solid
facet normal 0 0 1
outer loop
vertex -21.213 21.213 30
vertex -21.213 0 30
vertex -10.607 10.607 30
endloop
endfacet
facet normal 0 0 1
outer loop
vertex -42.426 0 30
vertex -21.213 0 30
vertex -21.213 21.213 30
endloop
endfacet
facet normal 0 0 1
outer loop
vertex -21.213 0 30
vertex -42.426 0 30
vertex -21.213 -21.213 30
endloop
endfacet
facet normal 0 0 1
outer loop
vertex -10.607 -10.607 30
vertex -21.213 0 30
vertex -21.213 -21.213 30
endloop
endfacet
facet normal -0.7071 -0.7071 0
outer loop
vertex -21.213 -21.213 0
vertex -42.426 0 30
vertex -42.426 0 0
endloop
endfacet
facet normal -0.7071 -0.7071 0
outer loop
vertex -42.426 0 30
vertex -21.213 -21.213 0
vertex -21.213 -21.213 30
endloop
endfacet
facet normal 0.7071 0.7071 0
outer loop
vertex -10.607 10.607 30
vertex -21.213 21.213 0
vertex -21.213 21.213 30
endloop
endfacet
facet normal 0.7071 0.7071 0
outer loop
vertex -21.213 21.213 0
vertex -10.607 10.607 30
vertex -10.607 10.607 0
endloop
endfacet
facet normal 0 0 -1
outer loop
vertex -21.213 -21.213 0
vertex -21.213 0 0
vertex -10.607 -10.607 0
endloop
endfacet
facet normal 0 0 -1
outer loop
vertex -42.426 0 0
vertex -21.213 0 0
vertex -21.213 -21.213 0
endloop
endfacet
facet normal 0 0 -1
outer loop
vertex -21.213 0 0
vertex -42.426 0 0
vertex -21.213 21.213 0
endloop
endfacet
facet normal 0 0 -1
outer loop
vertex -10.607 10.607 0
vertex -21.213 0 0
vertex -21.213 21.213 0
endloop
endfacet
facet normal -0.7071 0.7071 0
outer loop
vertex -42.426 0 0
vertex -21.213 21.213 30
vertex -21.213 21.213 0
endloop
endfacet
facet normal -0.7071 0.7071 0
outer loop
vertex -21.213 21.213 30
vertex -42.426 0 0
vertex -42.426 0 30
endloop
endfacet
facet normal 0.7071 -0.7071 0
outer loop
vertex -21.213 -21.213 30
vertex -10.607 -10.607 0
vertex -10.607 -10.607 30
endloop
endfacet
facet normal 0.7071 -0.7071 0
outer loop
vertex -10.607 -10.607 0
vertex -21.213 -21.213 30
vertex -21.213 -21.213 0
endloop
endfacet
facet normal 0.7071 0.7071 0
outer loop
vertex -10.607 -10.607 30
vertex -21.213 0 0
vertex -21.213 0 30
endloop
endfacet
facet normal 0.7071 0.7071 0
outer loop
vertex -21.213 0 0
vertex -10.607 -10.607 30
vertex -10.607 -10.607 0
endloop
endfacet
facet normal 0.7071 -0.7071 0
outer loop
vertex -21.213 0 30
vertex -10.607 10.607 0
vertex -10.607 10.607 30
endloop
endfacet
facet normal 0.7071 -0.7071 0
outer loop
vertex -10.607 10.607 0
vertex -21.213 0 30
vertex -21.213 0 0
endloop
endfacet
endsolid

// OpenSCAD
rotate([0,0,90])
rotate([0,-90,0]){
    difference(){
        rotate([-45,0,0]) {
            cube([30, 30, 30]);
        }
        scale([1,0.5,0.5]) {
            rotate([-45,0,0]) {
                cube([30, 30, 30]);
            }
        }
    }
}
